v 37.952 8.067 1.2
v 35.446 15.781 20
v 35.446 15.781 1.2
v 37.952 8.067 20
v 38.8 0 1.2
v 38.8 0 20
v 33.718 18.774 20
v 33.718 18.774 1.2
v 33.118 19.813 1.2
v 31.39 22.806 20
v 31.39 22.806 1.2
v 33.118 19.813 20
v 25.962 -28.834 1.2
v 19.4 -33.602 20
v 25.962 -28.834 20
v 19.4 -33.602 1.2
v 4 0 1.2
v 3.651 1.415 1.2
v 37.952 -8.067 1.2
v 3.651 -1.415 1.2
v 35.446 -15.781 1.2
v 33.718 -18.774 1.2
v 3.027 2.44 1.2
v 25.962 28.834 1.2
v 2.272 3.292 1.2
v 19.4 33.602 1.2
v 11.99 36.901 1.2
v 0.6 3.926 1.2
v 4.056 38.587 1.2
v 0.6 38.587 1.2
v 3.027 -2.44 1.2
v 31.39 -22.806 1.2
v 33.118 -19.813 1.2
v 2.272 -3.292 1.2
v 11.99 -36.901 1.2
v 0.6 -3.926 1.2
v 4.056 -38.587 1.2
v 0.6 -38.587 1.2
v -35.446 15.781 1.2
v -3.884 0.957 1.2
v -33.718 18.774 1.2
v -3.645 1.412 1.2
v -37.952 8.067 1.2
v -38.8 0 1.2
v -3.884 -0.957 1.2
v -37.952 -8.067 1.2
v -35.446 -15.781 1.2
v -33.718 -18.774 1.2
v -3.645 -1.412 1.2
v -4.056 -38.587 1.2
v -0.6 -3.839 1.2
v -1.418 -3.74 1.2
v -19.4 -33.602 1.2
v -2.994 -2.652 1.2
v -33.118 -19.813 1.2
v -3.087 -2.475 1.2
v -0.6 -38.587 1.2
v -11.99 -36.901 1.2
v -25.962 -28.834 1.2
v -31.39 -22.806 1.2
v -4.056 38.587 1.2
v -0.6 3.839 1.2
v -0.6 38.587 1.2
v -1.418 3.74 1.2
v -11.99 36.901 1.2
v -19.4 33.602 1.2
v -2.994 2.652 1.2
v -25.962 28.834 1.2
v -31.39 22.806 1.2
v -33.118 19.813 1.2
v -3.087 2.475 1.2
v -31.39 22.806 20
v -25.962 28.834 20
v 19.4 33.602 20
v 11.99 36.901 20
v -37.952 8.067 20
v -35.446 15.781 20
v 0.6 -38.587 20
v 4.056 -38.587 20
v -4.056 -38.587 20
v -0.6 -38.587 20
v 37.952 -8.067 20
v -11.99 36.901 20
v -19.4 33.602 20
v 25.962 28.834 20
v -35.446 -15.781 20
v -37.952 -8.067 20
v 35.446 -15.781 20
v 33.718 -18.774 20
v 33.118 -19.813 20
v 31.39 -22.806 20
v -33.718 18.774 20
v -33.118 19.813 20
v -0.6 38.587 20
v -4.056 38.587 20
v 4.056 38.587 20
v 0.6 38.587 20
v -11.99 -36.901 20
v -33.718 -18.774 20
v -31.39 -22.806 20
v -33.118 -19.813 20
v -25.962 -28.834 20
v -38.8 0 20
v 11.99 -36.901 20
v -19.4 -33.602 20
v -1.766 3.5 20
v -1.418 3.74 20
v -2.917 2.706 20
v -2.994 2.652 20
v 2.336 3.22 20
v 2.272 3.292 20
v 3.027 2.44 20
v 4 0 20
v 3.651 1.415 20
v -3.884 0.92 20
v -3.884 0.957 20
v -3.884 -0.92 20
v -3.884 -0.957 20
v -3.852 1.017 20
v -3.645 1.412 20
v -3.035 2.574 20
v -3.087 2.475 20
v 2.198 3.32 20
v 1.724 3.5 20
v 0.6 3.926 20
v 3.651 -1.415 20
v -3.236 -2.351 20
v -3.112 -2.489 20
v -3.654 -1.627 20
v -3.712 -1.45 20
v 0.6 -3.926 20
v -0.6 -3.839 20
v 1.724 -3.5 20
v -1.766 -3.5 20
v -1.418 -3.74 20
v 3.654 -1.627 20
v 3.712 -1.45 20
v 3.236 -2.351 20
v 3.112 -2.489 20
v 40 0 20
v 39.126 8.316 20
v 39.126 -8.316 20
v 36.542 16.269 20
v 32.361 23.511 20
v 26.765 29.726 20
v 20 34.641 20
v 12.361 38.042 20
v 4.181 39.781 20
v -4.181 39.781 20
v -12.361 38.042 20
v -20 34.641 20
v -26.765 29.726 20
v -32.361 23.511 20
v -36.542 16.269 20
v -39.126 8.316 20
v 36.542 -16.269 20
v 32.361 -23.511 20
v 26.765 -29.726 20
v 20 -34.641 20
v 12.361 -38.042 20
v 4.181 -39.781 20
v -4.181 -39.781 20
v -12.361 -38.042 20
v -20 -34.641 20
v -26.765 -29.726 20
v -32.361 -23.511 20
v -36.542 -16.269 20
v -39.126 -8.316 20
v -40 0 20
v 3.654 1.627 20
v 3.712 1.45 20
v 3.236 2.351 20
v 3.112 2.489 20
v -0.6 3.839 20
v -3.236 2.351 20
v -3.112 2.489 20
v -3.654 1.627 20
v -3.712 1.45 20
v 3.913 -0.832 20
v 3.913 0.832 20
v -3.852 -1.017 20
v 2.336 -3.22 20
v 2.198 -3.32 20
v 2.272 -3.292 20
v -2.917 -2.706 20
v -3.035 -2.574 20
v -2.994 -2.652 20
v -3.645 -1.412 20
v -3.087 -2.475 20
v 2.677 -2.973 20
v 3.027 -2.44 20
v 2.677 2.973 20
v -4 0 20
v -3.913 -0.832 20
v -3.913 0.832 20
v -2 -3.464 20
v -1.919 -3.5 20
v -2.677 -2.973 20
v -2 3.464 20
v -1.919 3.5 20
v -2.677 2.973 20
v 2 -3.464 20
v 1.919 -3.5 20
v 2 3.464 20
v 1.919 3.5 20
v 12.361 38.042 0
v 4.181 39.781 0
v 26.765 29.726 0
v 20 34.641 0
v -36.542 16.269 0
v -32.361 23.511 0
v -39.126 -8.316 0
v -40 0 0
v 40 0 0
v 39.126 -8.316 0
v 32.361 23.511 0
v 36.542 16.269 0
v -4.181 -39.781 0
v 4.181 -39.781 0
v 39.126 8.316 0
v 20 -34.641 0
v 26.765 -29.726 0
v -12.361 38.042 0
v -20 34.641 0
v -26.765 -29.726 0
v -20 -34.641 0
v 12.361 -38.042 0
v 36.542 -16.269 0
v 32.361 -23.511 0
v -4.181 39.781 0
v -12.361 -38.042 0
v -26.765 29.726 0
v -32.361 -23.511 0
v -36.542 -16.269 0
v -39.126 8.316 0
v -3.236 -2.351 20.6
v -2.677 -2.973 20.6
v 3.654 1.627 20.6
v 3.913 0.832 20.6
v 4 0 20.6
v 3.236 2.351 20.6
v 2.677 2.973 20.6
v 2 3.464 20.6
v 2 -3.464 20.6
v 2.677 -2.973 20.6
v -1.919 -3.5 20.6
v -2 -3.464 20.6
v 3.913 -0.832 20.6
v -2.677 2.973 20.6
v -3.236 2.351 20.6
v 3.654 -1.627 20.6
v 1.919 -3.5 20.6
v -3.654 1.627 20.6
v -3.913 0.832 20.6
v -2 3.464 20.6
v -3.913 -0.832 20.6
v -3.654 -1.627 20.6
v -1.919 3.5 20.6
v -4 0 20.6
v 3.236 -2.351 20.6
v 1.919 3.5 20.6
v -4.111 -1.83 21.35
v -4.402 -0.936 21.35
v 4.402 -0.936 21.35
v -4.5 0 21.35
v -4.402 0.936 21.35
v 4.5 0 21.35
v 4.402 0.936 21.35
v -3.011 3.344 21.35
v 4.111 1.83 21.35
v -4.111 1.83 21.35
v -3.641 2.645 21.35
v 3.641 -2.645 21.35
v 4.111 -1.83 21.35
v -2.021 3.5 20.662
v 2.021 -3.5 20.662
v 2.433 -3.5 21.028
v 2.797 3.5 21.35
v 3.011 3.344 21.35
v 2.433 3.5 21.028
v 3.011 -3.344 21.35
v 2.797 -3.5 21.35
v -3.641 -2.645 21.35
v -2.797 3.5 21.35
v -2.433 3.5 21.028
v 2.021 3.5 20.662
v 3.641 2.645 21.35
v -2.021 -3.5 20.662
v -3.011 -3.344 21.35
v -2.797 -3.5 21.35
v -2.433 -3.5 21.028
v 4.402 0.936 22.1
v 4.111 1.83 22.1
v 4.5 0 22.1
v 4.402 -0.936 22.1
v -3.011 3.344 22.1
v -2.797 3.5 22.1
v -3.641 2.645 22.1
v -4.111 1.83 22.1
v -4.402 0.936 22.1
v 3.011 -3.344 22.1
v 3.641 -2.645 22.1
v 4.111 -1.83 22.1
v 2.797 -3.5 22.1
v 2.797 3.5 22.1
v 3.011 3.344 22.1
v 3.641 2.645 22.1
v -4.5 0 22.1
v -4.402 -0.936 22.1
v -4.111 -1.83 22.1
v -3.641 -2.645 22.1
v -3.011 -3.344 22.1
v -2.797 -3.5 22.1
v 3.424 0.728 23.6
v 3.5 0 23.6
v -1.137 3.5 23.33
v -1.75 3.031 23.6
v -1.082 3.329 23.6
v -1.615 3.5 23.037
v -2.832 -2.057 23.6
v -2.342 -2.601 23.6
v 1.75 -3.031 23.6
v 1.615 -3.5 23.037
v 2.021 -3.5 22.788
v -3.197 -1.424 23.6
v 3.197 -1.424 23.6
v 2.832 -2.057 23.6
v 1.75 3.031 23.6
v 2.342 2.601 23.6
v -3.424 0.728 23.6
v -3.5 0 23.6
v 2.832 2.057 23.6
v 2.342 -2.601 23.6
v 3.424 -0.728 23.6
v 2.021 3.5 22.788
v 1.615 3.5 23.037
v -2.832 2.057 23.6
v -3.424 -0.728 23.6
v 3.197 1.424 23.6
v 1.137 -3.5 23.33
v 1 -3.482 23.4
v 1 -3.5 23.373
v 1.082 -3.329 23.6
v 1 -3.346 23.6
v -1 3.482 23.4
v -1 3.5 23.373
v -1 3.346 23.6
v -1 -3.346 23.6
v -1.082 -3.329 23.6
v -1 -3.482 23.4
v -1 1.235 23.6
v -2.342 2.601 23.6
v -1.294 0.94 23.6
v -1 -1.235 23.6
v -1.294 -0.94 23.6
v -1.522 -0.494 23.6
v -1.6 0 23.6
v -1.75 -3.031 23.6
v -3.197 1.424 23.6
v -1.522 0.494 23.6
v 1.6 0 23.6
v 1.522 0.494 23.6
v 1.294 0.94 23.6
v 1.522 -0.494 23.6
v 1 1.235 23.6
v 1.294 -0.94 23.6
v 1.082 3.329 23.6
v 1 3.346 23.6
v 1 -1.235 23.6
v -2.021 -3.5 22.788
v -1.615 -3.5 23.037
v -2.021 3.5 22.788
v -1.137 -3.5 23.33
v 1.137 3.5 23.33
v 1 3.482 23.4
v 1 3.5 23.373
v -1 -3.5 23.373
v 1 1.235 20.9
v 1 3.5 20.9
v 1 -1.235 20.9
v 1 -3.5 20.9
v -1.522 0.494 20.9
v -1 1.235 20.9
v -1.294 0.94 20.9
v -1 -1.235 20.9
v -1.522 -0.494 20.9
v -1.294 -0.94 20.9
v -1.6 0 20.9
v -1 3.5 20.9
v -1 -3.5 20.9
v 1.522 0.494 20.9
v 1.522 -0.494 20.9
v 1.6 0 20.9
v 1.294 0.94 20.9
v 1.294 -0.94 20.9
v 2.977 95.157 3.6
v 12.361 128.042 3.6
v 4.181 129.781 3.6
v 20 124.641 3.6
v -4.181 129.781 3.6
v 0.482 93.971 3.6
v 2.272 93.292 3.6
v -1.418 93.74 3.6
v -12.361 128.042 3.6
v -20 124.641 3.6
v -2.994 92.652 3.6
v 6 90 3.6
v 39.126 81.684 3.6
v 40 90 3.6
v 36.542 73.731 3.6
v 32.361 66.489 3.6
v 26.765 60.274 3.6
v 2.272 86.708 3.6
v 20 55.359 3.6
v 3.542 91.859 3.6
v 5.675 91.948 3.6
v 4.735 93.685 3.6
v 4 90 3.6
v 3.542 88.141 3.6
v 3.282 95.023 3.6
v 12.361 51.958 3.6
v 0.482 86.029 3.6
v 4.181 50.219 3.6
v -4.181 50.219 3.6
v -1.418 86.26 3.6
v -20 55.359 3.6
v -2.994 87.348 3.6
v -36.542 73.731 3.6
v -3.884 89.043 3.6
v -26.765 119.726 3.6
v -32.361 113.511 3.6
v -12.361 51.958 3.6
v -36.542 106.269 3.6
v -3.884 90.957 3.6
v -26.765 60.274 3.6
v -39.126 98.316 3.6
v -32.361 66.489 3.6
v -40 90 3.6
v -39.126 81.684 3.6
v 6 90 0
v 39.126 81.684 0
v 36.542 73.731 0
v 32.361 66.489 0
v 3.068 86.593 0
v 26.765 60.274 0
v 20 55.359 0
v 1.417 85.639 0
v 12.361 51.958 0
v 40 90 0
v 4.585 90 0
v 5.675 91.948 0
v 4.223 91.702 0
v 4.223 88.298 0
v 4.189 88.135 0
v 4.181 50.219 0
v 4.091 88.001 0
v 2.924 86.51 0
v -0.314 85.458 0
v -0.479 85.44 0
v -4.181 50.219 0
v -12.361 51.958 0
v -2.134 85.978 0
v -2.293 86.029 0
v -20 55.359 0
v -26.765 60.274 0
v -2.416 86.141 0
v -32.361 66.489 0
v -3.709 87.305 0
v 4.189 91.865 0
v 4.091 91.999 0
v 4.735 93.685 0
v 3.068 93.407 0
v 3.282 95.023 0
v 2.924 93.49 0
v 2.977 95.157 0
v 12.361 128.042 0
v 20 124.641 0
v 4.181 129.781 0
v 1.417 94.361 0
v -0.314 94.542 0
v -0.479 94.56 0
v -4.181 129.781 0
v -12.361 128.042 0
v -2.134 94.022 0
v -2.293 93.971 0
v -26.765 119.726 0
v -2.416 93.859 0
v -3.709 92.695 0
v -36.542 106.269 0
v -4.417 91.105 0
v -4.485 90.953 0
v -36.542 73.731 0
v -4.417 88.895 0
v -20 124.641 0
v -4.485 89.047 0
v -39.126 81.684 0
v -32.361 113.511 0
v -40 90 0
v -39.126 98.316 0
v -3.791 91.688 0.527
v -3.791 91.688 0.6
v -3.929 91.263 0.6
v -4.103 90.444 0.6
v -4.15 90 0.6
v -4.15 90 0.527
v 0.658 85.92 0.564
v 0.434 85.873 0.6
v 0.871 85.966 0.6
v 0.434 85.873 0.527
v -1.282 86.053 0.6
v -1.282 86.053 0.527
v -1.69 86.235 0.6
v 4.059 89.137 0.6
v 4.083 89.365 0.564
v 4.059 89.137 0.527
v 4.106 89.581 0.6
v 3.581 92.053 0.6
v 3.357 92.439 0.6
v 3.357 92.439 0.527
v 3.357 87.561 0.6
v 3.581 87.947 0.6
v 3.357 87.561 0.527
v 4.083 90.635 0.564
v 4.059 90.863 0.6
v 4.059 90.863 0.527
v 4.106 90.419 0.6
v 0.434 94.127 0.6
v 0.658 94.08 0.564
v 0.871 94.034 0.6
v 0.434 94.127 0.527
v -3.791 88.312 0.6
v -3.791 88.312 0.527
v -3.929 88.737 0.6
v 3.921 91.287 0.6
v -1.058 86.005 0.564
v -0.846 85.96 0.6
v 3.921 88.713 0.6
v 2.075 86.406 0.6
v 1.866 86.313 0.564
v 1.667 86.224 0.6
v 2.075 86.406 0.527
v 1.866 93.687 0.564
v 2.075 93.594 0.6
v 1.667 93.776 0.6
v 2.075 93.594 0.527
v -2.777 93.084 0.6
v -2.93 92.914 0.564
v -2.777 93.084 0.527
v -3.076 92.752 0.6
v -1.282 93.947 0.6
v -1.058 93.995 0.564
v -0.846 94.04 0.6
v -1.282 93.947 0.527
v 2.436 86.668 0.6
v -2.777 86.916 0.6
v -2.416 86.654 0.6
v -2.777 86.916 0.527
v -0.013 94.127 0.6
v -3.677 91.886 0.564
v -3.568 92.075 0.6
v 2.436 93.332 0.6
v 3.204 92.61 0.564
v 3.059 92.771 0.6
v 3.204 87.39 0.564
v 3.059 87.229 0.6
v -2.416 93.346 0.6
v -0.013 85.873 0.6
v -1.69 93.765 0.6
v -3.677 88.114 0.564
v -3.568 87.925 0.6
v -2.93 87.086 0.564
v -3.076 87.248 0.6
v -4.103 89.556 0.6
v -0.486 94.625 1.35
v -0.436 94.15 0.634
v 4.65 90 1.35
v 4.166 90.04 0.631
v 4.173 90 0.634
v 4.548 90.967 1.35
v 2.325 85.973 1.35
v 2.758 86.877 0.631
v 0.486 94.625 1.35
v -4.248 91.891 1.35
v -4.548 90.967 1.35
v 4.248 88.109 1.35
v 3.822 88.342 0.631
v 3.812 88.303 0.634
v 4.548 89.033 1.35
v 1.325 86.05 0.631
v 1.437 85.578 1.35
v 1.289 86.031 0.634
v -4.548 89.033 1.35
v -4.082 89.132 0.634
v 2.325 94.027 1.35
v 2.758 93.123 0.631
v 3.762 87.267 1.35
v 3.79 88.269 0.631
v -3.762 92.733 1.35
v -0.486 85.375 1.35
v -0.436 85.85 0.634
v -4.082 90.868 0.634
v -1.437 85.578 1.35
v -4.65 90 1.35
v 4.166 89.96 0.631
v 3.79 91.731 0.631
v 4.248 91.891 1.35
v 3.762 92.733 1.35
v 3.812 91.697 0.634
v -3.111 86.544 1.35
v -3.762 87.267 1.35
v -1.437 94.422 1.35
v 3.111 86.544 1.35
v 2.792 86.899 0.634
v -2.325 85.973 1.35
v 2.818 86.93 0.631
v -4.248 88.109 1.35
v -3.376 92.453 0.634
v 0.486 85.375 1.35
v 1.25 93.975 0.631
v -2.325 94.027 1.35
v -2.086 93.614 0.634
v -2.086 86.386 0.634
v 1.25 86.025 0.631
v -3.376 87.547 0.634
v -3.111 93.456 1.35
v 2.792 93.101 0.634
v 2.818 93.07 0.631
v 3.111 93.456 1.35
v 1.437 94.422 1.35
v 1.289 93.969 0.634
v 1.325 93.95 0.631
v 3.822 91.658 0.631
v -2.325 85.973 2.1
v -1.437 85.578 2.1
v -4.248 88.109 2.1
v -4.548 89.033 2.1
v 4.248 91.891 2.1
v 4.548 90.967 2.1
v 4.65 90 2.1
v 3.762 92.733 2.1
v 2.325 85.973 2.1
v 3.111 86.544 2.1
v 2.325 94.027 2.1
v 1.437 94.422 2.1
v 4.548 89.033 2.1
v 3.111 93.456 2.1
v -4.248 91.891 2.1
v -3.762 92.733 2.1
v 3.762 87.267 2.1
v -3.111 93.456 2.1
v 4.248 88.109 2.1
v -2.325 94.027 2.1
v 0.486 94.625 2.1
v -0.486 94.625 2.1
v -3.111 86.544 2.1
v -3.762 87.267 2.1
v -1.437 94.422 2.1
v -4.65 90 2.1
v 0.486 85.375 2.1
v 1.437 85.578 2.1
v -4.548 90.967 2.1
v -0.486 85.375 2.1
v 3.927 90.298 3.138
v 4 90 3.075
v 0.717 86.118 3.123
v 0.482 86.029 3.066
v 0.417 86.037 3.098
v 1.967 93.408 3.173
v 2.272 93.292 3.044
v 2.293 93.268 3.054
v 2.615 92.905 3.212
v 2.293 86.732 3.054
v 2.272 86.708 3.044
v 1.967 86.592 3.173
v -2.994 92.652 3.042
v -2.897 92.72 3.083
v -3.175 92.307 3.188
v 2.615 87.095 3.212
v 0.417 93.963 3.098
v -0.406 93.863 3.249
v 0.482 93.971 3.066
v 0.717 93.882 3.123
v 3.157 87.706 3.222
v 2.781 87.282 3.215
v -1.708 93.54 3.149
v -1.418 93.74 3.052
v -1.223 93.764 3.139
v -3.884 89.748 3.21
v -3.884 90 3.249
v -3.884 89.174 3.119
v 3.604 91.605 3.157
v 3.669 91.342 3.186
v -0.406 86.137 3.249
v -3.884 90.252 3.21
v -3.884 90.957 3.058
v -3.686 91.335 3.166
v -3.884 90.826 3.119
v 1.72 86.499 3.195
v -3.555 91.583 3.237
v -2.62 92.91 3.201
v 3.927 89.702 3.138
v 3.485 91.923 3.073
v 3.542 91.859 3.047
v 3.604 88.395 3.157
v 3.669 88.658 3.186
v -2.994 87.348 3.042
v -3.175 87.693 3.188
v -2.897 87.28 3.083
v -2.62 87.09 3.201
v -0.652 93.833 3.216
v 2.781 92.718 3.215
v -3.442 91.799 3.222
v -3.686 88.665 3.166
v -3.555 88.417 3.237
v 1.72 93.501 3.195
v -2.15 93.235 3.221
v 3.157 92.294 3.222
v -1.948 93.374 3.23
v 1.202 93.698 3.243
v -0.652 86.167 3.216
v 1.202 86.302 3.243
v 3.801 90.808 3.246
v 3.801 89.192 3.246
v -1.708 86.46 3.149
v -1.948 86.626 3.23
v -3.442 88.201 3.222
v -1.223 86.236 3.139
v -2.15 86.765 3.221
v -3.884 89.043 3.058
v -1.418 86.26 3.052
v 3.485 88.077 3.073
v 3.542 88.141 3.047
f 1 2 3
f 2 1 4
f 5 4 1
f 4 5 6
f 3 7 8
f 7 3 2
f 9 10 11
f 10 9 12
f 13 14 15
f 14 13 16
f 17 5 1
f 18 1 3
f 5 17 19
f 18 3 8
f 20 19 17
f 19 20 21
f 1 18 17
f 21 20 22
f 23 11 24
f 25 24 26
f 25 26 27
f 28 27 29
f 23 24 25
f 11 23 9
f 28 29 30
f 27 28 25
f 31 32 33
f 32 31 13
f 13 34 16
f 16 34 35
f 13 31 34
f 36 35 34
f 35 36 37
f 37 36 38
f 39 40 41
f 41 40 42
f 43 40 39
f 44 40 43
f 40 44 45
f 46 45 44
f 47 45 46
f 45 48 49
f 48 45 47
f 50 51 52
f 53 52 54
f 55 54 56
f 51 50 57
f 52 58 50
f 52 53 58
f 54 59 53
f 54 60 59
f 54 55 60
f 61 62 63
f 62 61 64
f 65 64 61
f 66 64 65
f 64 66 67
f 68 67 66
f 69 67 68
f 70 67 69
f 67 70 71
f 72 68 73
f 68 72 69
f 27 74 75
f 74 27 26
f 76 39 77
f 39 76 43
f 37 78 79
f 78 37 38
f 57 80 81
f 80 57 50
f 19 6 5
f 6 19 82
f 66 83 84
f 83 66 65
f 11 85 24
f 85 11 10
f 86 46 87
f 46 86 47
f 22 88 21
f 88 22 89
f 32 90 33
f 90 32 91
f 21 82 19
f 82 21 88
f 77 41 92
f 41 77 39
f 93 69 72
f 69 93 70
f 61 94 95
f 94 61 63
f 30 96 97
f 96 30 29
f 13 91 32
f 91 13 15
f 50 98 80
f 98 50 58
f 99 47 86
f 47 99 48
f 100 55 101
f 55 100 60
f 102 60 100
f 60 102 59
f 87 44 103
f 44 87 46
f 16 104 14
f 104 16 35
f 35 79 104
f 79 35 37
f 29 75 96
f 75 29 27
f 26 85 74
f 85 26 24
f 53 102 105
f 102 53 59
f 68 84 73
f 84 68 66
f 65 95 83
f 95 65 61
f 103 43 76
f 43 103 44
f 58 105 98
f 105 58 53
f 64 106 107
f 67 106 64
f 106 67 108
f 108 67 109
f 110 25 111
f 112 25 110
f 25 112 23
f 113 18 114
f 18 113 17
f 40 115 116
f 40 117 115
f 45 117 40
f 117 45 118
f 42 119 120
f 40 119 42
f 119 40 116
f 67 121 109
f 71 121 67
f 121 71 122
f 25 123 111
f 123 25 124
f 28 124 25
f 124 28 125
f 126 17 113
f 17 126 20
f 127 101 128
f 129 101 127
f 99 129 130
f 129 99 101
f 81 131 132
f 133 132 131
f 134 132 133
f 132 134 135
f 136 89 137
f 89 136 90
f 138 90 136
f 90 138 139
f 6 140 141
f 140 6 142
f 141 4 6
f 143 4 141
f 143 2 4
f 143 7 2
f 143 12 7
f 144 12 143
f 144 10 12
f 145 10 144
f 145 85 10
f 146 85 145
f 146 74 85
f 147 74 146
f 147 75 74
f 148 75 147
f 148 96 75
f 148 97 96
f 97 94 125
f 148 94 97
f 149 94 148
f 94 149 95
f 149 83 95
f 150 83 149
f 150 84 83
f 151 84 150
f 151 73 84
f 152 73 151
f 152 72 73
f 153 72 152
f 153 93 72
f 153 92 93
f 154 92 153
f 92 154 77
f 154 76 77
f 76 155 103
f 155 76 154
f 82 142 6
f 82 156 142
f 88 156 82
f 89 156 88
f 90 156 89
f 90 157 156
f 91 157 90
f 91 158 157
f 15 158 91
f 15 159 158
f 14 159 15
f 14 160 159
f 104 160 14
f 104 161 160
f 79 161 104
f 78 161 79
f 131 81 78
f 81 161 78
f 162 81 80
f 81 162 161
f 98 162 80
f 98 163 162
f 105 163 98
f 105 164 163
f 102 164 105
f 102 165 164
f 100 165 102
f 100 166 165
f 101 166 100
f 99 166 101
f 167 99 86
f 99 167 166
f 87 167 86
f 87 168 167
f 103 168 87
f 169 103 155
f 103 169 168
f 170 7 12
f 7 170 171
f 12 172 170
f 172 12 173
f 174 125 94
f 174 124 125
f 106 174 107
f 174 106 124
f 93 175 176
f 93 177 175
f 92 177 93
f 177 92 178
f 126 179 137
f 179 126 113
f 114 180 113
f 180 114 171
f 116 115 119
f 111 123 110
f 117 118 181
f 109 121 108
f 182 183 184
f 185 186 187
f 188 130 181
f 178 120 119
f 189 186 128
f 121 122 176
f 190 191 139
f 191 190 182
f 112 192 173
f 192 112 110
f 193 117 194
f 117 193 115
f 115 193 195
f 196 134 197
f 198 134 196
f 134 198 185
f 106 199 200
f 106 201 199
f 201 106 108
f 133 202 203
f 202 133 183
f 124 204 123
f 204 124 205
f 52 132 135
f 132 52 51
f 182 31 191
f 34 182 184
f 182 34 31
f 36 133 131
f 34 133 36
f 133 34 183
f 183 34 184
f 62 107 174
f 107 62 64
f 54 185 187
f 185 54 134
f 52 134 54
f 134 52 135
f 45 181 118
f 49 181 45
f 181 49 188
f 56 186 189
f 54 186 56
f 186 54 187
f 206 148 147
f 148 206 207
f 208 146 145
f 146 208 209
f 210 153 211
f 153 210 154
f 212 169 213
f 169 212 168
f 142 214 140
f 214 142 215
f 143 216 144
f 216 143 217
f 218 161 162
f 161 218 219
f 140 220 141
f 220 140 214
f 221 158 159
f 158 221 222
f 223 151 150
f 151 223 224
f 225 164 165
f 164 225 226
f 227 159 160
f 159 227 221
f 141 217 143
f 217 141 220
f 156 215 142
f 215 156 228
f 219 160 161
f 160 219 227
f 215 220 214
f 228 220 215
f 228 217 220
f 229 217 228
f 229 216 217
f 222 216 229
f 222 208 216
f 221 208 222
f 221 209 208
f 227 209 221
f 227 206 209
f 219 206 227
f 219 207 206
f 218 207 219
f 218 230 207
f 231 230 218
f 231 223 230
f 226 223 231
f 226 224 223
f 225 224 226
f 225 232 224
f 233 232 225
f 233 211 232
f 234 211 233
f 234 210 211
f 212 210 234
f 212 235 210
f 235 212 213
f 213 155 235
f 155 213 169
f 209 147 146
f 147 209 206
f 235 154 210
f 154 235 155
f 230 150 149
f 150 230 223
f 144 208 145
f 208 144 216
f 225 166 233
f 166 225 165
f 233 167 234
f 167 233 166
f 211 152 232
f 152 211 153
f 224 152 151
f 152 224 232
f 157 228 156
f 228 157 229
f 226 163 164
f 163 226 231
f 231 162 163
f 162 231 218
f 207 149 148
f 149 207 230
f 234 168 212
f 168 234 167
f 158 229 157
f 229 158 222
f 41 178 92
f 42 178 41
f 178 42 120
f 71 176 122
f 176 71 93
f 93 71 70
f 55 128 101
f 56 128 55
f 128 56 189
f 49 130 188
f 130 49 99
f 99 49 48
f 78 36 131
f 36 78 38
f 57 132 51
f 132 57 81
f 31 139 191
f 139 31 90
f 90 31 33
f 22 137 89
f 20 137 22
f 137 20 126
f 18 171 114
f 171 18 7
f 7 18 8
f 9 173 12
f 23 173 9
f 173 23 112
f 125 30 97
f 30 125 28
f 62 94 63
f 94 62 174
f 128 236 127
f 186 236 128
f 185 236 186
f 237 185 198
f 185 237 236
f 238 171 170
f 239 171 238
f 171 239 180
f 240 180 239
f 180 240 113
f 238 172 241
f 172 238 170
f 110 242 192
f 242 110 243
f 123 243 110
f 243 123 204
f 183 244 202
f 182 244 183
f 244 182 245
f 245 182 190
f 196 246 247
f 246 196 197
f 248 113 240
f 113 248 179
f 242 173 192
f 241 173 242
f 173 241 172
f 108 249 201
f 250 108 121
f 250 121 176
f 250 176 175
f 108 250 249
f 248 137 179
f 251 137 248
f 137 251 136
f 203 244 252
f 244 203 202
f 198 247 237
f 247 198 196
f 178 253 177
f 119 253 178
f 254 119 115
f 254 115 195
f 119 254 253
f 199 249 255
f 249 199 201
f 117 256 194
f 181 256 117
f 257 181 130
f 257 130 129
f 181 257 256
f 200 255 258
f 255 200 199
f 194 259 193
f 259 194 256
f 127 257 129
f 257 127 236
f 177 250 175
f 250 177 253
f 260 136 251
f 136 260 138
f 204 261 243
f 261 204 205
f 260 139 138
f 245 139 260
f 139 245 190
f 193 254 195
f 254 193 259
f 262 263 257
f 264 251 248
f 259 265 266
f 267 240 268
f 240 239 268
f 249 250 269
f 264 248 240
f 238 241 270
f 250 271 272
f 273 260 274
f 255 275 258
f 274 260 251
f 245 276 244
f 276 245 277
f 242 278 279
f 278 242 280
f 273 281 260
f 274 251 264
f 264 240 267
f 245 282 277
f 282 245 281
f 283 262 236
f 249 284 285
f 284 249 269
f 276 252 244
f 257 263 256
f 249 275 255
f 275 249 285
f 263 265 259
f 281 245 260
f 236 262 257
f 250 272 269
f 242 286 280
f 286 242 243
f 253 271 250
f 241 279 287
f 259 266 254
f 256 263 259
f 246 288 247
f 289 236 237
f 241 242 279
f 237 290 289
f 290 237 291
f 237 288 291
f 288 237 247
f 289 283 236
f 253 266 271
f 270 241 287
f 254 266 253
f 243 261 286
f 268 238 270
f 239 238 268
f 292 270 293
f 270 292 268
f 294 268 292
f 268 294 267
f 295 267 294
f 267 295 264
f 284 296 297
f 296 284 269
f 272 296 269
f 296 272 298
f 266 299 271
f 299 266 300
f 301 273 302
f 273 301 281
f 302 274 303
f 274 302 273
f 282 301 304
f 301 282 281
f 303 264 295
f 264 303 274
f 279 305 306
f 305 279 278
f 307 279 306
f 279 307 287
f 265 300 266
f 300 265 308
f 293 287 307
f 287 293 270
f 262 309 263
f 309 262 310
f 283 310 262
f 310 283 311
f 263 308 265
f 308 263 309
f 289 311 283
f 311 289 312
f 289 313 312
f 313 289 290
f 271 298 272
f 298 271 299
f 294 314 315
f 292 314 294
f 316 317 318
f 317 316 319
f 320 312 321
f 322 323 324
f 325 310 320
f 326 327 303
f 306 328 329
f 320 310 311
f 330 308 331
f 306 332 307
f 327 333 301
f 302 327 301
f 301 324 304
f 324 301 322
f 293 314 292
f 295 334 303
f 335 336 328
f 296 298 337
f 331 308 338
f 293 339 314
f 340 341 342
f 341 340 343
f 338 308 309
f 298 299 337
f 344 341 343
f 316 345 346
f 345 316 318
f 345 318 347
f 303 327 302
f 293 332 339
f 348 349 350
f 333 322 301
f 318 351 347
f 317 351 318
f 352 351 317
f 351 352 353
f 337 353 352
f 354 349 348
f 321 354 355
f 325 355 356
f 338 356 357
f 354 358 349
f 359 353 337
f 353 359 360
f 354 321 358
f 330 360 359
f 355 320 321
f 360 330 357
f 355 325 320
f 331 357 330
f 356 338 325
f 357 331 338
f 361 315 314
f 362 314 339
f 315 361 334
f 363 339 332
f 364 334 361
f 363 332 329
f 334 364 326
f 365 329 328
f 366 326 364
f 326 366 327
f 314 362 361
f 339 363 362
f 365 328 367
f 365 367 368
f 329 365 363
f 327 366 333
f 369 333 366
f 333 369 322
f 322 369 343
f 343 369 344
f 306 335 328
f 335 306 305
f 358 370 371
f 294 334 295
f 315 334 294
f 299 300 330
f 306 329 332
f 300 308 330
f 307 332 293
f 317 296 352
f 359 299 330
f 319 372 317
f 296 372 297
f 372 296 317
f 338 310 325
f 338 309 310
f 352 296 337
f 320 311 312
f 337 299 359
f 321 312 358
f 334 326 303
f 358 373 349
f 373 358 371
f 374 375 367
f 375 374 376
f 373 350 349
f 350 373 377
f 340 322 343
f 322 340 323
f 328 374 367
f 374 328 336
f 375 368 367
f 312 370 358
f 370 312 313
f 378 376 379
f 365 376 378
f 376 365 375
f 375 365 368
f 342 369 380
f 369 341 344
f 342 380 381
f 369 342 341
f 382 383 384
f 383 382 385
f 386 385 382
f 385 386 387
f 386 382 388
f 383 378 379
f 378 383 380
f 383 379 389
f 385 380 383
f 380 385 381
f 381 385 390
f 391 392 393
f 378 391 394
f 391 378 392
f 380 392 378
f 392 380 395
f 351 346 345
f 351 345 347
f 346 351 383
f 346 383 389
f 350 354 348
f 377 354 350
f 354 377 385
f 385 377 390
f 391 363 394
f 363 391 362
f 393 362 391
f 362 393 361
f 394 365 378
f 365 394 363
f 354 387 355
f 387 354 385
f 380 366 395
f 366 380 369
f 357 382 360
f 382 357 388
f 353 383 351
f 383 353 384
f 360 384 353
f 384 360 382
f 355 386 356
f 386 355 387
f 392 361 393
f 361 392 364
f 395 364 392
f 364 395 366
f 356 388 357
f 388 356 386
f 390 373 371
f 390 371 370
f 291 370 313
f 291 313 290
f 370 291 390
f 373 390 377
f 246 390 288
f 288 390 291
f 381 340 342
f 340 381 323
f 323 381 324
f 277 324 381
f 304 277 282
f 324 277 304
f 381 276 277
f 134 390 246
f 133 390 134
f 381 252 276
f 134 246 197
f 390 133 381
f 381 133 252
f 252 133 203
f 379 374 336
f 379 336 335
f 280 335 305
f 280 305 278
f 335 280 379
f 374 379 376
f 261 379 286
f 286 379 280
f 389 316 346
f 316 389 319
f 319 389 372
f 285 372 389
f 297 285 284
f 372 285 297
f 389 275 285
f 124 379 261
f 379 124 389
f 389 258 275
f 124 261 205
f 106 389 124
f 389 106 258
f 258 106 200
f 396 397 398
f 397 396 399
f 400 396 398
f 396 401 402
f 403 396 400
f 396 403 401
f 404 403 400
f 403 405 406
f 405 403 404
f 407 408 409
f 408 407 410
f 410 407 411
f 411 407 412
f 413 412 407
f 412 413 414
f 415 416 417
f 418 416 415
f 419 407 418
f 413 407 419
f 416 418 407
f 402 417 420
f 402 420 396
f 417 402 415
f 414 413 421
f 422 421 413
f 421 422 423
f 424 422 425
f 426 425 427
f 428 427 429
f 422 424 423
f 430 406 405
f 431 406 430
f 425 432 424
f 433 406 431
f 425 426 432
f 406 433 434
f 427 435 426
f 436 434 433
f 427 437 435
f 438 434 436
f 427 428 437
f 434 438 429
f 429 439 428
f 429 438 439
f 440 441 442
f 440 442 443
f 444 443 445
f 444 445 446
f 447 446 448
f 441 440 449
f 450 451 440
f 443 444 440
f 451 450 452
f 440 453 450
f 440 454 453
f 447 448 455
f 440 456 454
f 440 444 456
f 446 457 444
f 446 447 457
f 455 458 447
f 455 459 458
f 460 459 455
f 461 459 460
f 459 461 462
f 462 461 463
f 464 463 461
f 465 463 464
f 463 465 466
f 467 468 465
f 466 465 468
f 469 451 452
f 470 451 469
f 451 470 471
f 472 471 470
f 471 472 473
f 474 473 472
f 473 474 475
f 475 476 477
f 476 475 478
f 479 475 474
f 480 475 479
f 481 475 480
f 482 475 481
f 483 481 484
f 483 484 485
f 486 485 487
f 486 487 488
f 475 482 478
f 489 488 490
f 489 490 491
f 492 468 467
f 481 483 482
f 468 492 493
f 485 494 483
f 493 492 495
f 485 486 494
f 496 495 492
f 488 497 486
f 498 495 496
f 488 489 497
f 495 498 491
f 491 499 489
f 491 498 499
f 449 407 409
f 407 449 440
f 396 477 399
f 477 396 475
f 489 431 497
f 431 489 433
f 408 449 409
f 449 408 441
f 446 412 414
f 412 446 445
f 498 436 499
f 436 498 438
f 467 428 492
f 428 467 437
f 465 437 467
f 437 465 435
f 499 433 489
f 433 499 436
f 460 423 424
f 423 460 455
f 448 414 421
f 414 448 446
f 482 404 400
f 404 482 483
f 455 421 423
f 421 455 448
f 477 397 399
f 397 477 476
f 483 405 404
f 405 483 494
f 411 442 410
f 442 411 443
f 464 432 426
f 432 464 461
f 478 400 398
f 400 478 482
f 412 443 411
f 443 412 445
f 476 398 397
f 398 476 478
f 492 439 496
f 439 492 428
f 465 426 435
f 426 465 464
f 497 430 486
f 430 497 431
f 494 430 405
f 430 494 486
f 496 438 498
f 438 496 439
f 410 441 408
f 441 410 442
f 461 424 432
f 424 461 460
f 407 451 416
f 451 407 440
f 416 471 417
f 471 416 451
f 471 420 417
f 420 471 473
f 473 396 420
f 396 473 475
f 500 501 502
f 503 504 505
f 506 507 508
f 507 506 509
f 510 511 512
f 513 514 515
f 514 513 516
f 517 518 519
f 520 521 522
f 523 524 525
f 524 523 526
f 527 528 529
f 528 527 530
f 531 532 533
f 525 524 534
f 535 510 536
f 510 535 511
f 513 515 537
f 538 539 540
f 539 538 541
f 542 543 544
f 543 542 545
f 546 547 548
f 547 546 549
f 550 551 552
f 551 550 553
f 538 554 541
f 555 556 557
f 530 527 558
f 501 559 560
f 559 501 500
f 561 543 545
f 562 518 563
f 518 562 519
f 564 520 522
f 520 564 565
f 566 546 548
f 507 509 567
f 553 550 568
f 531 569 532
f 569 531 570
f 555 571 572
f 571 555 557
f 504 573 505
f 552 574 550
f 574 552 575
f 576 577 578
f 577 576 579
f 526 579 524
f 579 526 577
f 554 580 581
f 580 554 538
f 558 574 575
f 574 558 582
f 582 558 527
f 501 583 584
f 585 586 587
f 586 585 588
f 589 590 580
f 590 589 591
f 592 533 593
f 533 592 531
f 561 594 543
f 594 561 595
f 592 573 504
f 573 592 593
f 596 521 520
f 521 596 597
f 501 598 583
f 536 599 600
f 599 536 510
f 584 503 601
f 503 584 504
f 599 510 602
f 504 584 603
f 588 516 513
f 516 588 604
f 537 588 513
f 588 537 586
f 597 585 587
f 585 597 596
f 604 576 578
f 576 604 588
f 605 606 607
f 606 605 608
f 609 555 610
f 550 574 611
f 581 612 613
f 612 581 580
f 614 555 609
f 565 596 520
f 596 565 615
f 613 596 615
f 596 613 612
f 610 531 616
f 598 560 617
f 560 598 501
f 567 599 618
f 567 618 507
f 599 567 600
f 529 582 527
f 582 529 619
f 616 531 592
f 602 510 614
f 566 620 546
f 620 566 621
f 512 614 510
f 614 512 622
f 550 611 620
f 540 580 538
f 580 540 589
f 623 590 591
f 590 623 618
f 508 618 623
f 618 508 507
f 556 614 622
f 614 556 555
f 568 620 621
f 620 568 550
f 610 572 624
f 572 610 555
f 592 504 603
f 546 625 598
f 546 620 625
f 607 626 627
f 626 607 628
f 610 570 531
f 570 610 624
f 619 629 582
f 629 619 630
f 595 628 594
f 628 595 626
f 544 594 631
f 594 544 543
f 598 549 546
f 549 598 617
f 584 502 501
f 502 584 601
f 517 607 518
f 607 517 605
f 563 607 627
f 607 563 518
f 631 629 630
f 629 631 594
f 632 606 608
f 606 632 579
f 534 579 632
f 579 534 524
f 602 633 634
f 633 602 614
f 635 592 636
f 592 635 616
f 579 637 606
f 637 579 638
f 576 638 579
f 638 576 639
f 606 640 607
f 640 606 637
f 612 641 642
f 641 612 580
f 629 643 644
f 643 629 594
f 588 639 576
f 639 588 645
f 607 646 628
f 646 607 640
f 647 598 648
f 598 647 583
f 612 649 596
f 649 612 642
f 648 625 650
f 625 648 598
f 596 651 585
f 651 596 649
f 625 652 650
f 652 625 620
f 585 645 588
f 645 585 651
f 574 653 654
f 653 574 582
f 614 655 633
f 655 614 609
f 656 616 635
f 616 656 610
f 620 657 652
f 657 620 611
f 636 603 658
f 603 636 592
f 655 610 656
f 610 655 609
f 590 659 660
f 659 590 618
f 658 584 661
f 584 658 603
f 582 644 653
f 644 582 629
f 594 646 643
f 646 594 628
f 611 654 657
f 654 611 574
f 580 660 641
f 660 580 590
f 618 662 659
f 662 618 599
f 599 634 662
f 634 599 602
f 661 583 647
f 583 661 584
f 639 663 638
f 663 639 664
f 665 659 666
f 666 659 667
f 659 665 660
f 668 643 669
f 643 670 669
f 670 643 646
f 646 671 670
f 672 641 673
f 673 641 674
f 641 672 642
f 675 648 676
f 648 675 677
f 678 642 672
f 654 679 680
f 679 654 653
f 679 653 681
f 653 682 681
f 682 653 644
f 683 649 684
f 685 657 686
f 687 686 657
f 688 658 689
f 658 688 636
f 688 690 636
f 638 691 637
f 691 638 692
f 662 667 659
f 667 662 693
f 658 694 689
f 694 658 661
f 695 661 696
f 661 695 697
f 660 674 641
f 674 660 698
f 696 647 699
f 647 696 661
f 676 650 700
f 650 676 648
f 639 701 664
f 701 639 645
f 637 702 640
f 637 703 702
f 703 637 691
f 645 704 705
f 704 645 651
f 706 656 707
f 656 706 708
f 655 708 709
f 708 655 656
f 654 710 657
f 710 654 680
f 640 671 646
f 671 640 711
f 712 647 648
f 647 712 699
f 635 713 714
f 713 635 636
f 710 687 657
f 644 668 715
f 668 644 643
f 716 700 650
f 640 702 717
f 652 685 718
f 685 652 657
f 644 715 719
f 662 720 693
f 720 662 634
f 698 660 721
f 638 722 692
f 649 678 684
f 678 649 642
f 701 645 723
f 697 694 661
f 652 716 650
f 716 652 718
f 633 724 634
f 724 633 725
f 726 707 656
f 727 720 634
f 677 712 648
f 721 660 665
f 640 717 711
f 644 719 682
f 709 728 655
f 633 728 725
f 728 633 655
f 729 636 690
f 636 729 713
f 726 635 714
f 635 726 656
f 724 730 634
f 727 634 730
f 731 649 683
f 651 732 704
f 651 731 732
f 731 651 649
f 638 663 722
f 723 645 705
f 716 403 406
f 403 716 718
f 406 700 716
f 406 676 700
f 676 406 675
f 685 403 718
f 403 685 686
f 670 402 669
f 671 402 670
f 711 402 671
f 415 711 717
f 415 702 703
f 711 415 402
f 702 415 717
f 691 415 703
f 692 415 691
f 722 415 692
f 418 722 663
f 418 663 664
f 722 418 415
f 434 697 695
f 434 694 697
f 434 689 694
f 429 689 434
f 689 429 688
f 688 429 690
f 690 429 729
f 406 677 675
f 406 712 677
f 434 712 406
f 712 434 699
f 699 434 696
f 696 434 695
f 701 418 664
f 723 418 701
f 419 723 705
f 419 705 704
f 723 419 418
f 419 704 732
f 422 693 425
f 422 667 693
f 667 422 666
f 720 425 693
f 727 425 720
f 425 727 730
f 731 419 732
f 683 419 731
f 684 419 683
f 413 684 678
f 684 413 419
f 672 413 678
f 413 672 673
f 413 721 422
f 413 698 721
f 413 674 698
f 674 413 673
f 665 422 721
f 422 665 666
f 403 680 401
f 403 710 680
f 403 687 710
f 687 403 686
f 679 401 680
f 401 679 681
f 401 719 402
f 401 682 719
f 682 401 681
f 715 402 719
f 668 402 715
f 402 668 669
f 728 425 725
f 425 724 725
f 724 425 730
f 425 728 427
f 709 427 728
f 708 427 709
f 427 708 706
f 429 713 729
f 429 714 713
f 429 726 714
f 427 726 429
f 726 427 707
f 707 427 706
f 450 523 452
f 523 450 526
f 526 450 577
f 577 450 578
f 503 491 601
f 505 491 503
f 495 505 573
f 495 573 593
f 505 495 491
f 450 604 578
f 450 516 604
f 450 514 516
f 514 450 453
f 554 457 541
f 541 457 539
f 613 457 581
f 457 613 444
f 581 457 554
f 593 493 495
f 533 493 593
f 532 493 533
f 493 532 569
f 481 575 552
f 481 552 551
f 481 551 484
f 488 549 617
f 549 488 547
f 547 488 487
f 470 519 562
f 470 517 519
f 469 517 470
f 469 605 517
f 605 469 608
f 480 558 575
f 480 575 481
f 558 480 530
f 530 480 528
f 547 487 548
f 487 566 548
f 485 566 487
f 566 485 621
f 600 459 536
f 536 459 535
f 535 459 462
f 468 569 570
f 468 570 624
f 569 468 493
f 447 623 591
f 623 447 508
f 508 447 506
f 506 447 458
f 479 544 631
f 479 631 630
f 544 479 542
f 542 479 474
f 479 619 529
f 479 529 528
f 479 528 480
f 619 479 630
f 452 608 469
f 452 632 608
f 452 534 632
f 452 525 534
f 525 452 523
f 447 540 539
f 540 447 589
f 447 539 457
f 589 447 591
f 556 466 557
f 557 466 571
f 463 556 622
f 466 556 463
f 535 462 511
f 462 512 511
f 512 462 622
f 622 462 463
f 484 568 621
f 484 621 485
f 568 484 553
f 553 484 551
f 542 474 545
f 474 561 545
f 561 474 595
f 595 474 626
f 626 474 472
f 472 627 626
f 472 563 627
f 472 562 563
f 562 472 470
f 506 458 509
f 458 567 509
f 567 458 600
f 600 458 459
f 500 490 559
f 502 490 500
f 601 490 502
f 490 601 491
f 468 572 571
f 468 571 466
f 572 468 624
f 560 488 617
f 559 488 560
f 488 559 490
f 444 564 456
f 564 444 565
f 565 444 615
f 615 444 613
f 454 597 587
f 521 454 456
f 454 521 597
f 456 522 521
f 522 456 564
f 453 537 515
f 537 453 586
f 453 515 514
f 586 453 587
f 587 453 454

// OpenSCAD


//include <pins.scad>;

// Parametric round box by camperking v0.2
// http://www.thingiverse.com/thing:12134
// added option to screw the lid with a M3 screw
// improved thickness of the pin connectors
// usage is round_box(diameter, height, sections, wall_thickness, pin)
// diameter - is the diameter of your box
// height - defines the height of the box
// sections - how many sections you want
// wall_thickness - define your wallthickness, the pins height is 3 times the wallthickness
// pin - set to true if you want tbusers pin connector for the lid, set to false if you want to mount the lidwith a M3 screw
//
//usage for the lid is round_box_cover(diameter, sections, wall_thickness, pin)
// wall_thickness - this should be same value you have used at the box because the pinhole and pin height are calculated with this
//
//uncomment the following lines to test
//round_box(80, 20, 6, 1.2, true);
//round_box_cover(80, 6, 1.2, true);


/* [Global] */
part = "both"; // [first:Round Box only,second:Lid only,both:Box and lid]

Diameter = 80; // [10:250]
Height = 20; // [5:120]
Number_of_Sections = 6; // [0:32]
Pin_or_Hole = "Pin"; // [Pin, Hole]

/* [Hidden] */
diameter = Diameter;
height = Height;
sections = Number_of_Sections;
wall_thickness = 1.2;
pin = Pin_or_Hole;


if (part == "first") {
		round_box(diameter, height, sections, wall_thickness, pin);
	} else if (part == "second") {
		round_box_cover(diameter, sections, wall_thickness, pin);
	} else if (part == "both") {
      round_box(diameter, height, sections, wall_thickness, pin);
		translate([0, diameter+10, 0]) round_box_cover(diameter, sections, wall_thickness, pin);
	} else {
		both();
	}

module round_box(diameter, height, sections, wall_thickness, pin) {
	difference() {
		cylinder(h=height, r=diameter/2);
		if (pin == "Hole") {
			cylinder(h=height, r=1.25);
		}
		difference() {
			translate([0, 0, wall_thickness]) cylinder(h=height, r=diameter/2-wall_thickness);
			cylinder(h=height, r=4);
		}
		
	}
	for(i=[1:sections]) {
		rotate([0, 0, i * 360/sections]) translate([-wall_thickness/2, wall_thickness*2, 0]) cube([wall_thickness, diameter/2-wall_thickness*3, height]);
	}
	if (pin == "Pin") {
		translate([0, 0, height]) pin(h=wall_thickness*3);
	} 
}

module round_box_cover(diameter, sections, wall_thickness, pin) {
	difference() { union() {
		difference() {
			cylinder(h=wall_thickness*3, r=diameter/2);		
			difference() {
				cube([diameter, diameter, wall_thickness*3]);
				rotate([0, 0, 360/sections]) cube([diameter, diameter, wall_thickness*3]);
			}
		} 
			cylinder(h=wall_thickness*3, r=6);
		}
		if (pin == "Pin") {
			pinhole(h=wall_thickness*3);
		} else {
			cylinder(h=wall_thickness*3, r=1.5);
		}
	}
}





///////////////////////////////////////////////////////////////////////////
// Pin Connectors V2
// Tony Buser <tbuser@gmail.com>

// pinhole(h=5);

// test();
// pintack(h=10);
// pinpeg(h=20);

module test() {
  tolerance = 0.3;
  
  translate([-12, 12, 0]) pinpeg(h=20);
  translate([12, 12, 0]) pintack(h=10);
  
  difference() {
    union() {
      translate([0, -12, 2.5]) cube(size = [59, 20, 5], center = true);
      translate([24, -12, 7.5]) cube(size = [12, 20, 15], center = true);
    }
    translate([-24, -12, 0]) pinhole(h=5, t=tolerance);
    translate([-12, -12, 0]) pinhole(h=5, t=tolerance, tight=false);
    translate([0, -12, 0]) pinhole(h=10, t=tolerance);
    translate([12, -12, 0]) pinhole(h=10, t=tolerance, tight=false);
    translate([24, -12, 15]) rotate([0, 180, 0]) pinhole(h=10, t=tolerance);
  }
}

module pinhole(h=10, r=4, lh=3, lt=1, t=0.3, tight=true) {
  // h = shaft height
  // r = shaft radius
  // lh = lip height
  // lt = lip thickness
  // t = tolerance
  // tight = set to false if you want a joint that spins easily
  
  union() {
    pin_solid(h, r+(t/2), lh, lt);
    cylinder(h=h+0.2, r=r);
    // widen the cylinder slightly
    // cylinder(h=h+0.2, r=r+(t-0.2/2));
    if (tight == false) {
      cylinder(h=h+0.2, r=r+(t/2)+0.25);
    }
    // widen the entrance hole to make insertion easier
    translate([0, 0, -0.1]) cylinder(h=lh/3, r2=r, r1=r+(t/2)+(lt/2));
  }
}

module pin(h=10, r=4, lh=3, lt=1, side=false) {
  // h = shaft height
  // r = shaft radius
  // lh = lip height
  // lt = lip thickness
  // side = set to true if you want it printed horizontally

  if (side) {
    pin_horizontal(h, r, lh, lt);
  } else {
    pin_vertical(h, r, lh, lt);
  }
}

module pintack(h=10, r=4, lh=3, lt=1, bh=3, br=8.75) {
  // bh = base_height
  // br = base_radius
  
  union() {
    cylinder(h=bh, r=br);
    translate([0, 0, bh]) pin(h, r, lh, lt);
  }
}

module pinpeg(h=20, r=4, lh=3, lt=1) {
  union() {
    translate([0, -h/4+0.05, 0]) pin(h/2+0.1, r, lh, lt, side=true);
    translate([0, h/4-0.05, 0]) rotate([0, 0, 180]) pin(h/2+0.1, r, lh, lt, side=true);
  }
}

// just call pin instead, I made this module because it was easier to do the rotation option this way
// since openscad complains of recursion if I did it all in one module
module pin_vertical(h=10, r=4, lh=3, lt=1) {
  // h = shaft height
  // r = shaft radius
  // lh = lip height
  // lt = lip thickness

  difference() {
    pin_solid(h, r, lh, lt);
    
    // center cut
    translate([-r*0.5/2, -(r*2+lt*2)/2, h/4]) cube([r*0.5, r*2+lt*2, h]);
    translate([0, 0, h/4]) cylinder(h=h+lh, r=r/2.5, $fn=20);
    // center curve
    // translate([0, 0, h/4]) rotate([90, 0, 0]) cylinder(h=r*2, r=r*0.5/2, center=true, $fn=20);
  
    // side cuts
    translate([-r*2, -lt-r*1.125, -1]) cube([r*4, lt*2, h+2]);
    translate([-r*2, -lt+r*1.125, -1]) cube([r*4, lt*2, h+2]);
  }
}

// call pin with side=true instead of this
module pin_horizontal(h=10, r=4, lh=3, lt=1) {
  // h = shaft height
  // r = shaft radius
  // lh = lip height
  // lt = lip thickness
  translate([0, h/2, r*1.125-lt]) rotate([90, 0, 0]) pin_vertical(h, r, lh, lt);
}

// this is mainly to make the pinhole module easier
module pin_solid(h=10, r=4, lh=3, lt=1) {
  union() {
    // shaft
    cylinder(h=h-lh, r=r, $fn=30);
    // lip
    // translate([0, 0, h-lh]) cylinder(h=lh*0.25, r1=r, r2=r+(lt/2), $fn=30);
    // translate([0, 0, h-lh+lh*0.25]) cylinder(h=lh*0.25, r2=r, r1=r+(lt/2), $fn=30);
    // translate([0, 0, h-lh+lh*0.50]) cylinder(h=lh*0.50, r1=r, r2=r-(lt/2), $fn=30);

    // translate([0, 0, h-lh]) cylinder(h=lh*0.50, r1=r, r2=r+(lt/2), $fn=30);
    // translate([0, 0, h-lh+lh*0.50]) cylinder(h=lh*0.50, r1=r+(lt/2), r2=r-(lt/3), $fn=30);    

    translate([0, 0, h-lh]) cylinder(h=lh*0.25, r1=r, r2=r+(lt/2), $fn=30);
    translate([0, 0, h-lh+lh*0.25]) cylinder(h=lh*0.25, r=r+(lt/2), $fn=30);    
    translate([0, 0, h-lh+lh*0.50]) cylinder(h=lh*0.50, r1=r+(lt/2), r2=r-(lt/2), $fn=30);    

    // translate([0, 0, h-lh]) cylinder(h=lh, r1=r+(lt/2), r2=1, $fn=30);
    // translate([0, 0, h-lh-lt/2]) cylinder(h=lt/2, r1=r, r2=r+(lt/2), $fn=30);
  }
}
